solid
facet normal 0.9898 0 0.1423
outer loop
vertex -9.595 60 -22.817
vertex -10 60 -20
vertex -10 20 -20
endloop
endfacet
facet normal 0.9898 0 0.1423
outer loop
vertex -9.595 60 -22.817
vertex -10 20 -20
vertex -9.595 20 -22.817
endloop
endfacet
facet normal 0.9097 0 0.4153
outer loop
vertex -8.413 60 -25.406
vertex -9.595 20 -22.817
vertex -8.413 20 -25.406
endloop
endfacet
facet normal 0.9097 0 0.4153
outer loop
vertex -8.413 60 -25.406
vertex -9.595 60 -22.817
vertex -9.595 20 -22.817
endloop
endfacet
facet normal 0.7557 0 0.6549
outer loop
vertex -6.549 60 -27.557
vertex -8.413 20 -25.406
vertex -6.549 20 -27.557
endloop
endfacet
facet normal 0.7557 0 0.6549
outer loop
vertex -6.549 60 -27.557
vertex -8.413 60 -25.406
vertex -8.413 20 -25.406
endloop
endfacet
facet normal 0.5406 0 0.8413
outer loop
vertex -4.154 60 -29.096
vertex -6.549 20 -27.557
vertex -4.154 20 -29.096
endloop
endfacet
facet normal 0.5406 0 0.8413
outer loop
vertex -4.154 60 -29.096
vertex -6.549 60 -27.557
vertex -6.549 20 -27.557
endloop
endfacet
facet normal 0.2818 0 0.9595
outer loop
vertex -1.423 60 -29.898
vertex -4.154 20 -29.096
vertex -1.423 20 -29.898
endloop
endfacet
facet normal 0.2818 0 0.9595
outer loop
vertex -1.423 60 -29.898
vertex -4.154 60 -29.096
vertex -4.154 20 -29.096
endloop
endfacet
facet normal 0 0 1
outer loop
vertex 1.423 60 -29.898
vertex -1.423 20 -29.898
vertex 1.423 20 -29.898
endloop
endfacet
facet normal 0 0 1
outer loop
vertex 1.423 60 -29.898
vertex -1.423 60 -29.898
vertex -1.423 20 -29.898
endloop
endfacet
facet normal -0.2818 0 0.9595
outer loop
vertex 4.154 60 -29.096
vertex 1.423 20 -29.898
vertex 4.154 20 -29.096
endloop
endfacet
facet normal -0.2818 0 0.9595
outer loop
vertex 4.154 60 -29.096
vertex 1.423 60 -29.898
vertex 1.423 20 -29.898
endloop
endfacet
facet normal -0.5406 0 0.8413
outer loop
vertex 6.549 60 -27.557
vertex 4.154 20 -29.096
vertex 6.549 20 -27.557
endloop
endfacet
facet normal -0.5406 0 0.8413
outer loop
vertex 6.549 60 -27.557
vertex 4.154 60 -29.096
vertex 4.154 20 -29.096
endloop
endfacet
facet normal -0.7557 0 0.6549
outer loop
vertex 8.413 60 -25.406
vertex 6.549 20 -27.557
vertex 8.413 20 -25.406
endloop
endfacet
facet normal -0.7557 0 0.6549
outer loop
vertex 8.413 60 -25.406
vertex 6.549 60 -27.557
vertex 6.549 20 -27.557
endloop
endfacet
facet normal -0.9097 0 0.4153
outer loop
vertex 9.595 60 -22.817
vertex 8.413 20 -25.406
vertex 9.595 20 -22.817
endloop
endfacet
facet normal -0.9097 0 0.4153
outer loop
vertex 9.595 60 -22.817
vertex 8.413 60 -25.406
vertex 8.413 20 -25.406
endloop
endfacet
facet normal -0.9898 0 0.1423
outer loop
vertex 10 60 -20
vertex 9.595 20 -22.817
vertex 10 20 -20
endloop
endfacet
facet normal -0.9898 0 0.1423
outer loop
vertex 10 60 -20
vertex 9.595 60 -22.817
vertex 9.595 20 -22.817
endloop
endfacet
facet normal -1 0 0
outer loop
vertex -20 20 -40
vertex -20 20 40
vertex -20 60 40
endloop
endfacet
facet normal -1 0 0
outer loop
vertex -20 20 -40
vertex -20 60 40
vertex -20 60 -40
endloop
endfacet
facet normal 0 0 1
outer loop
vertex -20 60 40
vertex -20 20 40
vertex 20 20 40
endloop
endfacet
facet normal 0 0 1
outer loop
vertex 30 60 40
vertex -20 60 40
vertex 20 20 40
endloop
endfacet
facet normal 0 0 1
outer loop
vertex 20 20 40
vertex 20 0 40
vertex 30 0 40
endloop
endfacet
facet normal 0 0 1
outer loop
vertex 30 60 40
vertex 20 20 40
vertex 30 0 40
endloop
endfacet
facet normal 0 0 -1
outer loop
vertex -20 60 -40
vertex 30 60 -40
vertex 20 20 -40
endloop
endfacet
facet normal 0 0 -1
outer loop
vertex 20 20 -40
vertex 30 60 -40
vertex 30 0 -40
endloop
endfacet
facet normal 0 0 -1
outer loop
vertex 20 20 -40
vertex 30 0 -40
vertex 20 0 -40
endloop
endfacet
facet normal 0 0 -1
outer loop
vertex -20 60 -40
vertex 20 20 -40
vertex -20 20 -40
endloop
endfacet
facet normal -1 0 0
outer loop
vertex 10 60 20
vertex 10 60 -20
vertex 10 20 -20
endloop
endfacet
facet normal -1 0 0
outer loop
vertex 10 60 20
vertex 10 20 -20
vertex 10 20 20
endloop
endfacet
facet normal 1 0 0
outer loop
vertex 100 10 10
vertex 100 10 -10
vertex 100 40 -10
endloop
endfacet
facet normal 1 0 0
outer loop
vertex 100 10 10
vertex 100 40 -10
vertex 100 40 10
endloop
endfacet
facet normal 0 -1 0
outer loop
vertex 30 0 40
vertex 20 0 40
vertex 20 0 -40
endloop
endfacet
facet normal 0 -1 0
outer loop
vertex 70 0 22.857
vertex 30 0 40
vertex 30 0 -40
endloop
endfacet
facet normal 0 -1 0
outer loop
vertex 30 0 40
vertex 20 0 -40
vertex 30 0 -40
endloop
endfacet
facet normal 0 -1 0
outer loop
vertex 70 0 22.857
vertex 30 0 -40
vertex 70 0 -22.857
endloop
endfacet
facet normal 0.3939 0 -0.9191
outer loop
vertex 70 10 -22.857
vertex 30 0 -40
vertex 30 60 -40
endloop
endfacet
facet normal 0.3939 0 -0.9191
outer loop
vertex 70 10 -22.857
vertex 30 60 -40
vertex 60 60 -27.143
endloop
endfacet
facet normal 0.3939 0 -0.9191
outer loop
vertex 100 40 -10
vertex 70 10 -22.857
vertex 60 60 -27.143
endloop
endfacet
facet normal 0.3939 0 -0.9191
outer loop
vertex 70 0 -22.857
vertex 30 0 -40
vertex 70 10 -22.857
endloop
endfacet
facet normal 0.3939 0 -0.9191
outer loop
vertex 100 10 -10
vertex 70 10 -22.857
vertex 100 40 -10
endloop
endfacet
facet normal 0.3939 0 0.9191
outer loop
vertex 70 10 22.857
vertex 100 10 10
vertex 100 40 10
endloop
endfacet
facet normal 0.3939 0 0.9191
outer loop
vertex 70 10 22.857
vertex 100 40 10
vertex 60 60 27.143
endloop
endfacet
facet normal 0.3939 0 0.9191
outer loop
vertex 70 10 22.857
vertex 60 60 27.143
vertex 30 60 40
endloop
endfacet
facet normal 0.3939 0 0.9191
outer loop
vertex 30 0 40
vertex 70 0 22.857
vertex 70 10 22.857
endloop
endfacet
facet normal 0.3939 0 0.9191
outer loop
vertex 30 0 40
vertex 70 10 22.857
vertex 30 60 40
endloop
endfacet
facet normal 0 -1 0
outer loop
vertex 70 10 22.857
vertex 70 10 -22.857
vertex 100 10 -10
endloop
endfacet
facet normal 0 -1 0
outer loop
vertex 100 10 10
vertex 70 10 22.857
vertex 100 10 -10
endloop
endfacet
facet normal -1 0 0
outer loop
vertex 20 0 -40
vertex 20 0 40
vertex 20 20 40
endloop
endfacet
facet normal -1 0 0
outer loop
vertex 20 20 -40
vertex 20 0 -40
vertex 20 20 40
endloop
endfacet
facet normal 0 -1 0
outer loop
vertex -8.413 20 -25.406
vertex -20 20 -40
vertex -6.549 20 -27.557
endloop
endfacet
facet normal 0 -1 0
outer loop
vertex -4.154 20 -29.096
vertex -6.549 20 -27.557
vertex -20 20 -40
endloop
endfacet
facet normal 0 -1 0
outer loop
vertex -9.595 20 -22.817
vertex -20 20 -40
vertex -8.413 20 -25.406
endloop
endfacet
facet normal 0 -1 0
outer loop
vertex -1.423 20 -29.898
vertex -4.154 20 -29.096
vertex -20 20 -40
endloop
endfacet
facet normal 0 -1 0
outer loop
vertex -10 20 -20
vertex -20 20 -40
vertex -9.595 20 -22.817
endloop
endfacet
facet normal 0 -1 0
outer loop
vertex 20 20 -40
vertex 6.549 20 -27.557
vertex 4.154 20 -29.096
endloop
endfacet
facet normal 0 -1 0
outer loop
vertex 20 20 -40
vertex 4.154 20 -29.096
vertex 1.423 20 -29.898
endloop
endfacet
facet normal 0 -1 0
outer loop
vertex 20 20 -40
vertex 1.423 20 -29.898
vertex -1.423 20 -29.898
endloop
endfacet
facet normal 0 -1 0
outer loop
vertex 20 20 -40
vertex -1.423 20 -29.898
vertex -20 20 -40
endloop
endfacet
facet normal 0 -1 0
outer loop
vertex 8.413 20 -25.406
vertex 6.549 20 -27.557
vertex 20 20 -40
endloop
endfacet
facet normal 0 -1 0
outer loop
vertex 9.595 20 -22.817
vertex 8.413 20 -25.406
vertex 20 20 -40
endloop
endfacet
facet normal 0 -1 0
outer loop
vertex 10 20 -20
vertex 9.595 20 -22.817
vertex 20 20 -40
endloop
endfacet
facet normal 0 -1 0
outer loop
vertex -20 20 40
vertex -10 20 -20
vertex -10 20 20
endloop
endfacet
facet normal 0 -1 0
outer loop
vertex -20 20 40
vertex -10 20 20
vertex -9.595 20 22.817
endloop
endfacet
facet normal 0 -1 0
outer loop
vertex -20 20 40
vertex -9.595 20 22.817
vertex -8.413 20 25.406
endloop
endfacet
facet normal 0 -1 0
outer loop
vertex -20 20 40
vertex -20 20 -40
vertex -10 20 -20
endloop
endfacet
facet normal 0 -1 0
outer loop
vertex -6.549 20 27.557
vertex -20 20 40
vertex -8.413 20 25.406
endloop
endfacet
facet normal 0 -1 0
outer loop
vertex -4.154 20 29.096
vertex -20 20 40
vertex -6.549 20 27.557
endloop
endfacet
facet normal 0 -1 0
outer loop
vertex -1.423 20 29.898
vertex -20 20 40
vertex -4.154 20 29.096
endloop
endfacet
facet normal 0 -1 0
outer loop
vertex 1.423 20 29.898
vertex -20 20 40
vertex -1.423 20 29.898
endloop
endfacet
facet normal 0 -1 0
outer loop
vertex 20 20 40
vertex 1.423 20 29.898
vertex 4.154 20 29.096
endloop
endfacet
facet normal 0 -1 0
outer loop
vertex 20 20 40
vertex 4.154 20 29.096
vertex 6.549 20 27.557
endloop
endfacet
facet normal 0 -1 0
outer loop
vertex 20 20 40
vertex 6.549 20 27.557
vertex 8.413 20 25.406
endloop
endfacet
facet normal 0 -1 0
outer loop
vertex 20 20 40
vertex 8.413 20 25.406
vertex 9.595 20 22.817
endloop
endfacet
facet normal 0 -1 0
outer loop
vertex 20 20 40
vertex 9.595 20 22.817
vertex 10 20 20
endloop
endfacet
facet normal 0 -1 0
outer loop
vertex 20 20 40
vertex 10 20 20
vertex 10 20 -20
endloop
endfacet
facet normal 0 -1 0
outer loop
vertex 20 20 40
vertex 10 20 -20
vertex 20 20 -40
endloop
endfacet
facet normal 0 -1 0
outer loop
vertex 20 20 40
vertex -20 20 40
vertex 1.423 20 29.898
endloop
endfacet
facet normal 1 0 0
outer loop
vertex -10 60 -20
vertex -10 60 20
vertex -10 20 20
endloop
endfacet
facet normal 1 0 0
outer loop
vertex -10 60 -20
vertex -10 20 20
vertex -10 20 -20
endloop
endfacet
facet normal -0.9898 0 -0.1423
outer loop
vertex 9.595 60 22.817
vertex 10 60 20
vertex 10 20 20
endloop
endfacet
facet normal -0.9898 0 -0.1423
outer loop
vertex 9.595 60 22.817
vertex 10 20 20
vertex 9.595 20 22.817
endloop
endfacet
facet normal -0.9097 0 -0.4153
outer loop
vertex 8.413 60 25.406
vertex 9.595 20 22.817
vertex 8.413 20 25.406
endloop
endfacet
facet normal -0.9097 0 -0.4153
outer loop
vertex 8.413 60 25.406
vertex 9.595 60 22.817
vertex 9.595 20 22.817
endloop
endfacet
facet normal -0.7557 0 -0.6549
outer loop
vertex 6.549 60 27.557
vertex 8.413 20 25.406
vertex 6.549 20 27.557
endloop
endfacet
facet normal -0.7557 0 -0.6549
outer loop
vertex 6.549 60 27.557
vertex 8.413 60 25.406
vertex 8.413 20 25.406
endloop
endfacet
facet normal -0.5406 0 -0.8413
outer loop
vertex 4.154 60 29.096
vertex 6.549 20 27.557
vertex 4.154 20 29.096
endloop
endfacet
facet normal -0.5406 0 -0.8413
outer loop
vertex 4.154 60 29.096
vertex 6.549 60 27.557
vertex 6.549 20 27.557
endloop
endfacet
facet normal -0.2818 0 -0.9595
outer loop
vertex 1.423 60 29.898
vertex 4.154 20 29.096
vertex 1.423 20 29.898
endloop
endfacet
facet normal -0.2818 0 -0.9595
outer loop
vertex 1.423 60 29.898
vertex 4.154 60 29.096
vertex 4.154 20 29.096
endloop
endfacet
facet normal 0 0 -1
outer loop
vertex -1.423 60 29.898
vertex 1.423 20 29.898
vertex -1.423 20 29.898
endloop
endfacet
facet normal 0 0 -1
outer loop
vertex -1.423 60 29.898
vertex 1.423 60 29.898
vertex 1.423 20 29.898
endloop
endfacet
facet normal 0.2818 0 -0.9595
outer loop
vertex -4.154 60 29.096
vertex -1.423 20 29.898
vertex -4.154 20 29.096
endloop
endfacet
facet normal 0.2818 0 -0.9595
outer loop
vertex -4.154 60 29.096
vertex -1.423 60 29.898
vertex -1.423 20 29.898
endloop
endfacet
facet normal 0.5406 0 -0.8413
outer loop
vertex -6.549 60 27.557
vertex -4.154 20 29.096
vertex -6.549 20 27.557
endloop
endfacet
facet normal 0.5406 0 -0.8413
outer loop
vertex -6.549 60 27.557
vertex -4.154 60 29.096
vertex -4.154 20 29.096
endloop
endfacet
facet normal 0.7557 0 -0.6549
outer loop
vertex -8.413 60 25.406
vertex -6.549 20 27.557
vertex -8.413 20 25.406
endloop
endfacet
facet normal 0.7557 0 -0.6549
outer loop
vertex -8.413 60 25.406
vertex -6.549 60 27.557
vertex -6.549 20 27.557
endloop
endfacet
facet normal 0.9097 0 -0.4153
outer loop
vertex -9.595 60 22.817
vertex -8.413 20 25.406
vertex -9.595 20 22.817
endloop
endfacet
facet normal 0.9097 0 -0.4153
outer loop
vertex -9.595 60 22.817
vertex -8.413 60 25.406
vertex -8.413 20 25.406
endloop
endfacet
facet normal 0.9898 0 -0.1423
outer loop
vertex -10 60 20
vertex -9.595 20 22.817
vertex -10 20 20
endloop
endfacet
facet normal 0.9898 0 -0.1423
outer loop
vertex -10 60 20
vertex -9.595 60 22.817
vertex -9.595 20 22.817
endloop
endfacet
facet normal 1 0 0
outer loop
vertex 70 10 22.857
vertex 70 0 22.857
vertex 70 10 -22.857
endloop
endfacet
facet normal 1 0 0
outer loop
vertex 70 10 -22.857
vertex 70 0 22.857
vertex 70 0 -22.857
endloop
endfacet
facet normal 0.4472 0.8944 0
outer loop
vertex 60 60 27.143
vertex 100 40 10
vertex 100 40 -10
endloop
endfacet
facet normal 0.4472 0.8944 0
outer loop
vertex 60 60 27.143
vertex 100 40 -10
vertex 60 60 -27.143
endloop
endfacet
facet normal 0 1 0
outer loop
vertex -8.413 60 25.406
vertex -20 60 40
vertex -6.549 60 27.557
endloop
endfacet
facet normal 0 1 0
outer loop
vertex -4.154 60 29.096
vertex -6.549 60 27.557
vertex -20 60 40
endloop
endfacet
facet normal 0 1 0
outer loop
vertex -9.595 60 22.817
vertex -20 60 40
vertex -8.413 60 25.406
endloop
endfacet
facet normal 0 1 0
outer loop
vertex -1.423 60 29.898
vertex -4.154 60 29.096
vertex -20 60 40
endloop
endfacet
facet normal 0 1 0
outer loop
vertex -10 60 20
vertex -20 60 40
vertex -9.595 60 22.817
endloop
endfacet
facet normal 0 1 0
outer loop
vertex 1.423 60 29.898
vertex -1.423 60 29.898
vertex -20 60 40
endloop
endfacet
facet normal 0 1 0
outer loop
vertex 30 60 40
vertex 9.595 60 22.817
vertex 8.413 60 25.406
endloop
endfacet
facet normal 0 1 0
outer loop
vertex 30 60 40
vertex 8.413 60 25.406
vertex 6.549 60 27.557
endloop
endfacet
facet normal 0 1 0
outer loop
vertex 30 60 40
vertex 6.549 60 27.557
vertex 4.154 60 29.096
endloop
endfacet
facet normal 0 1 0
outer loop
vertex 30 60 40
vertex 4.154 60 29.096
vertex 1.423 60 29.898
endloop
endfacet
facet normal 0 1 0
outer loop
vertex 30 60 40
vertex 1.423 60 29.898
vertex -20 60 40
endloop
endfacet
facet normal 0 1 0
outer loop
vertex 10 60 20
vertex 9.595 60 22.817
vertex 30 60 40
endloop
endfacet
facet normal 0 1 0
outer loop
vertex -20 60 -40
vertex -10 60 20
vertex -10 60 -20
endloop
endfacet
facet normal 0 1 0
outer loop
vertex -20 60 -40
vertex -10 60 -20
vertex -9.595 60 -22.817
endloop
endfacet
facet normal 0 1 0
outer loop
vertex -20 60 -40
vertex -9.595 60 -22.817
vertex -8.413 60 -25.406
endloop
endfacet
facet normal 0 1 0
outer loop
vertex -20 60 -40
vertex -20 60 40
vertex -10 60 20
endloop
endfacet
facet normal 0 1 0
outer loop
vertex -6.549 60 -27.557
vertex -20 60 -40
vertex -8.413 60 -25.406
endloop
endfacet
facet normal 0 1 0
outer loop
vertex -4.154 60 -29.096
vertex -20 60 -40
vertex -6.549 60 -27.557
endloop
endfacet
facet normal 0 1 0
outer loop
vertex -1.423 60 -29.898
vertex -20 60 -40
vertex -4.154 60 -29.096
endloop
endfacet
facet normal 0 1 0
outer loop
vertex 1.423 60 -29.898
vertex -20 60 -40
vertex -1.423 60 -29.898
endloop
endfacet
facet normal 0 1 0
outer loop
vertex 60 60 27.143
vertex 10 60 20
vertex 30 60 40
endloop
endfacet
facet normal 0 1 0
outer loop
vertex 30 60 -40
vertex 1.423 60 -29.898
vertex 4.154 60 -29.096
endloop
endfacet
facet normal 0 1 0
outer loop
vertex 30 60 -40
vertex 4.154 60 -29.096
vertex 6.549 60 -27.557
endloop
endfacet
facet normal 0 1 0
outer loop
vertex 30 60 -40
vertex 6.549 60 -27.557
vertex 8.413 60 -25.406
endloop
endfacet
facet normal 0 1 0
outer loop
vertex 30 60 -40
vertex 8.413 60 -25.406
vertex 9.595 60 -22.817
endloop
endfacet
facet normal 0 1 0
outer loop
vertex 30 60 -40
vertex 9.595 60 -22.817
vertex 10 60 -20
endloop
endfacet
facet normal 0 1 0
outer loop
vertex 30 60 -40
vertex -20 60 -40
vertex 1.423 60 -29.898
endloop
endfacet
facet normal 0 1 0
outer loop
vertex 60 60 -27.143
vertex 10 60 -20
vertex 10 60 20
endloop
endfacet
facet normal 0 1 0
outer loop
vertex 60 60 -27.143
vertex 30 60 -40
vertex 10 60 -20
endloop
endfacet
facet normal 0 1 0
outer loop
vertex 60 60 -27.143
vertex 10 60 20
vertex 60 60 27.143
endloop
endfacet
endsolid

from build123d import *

# Parameters (mm, degrees)
SKETCH1_W           = 40
SKETCH1_H           = 80
SKETCH1_W_2         = 10
BOSS_EXTRUDE1_DEPTH = 60
SKETCH2_W           = 40
SKETCH2_H           = 20
CUT_EXTRUDE1_DEPTH  = 81
CUT_EXTRUDE2_DEPTH  = 10
CUT_EXTRUDE3_DEPTH  = 61
CUT_EXTRUDE4_DEPTH  = 81


with BuildPart() as part:
    # Sketch1 → Boss-Extrude1 (new body)
    with BuildSketch(Plane(origin=(0, 0, 0), x_dir=(1, 0, 0), z_dir=(0, 1, 0))):
        Rectangle(SKETCH1_W, SKETCH1_H)
        Polygon((100, -10), (30, -40), (30, 40), (100, 10), align=None)
        with Locations((25, 0)):
            Rectangle(SKETCH1_W_2, SKETCH1_H)
    extrude(amount=BOSS_EXTRUDE1_DEPTH)

    # Sketch2 → Cut-Extrude1 (cut, through all)
    with BuildSketch(Plane.XY.offset(40)):
        with Locations((0, 10)):
            Rectangle(SKETCH2_W, SKETCH2_H)
    extrude(amount=-CUT_EXTRUDE1_DEPTH, mode=Mode.SUBTRACT)

    # Sketch3 → Cut-Extrude2 (cut)
    with BuildSketch(Plane.XZ):
        Polygon((70, 0), (100, 0), (100, 10), (70, 22.857142857), align=None)
        Polygon((100, -10), (100, 0), (70, 0), (70, -22.857142857), align=None)
    extrude(amount=-CUT_EXTRUDE2_DEPTH, mode=Mode.SUBTRACT)

    # Sketch5 → Cut-Extrude3 (cut, through all)
    with BuildSketch(Plane(origin=(0, 60, 0), x_dir=(1, 0, 0), z_dir=(0, 1, 0))):
        with BuildLine():
            Line((-10, -20), (-10, 20))
            ThreePointArc((-10, 20), (0, 30), (10, 20))
            Line((10, 20), (10, -20))
            ThreePointArc((10, -20), (0, -30), (-10, -20))
        make_face()
    extrude(amount=-CUT_EXTRUDE3_DEPTH, mode=Mode.SUBTRACT)

    # Sketch6 → Cut-Extrude4 (cut, through all)
    with BuildSketch(Plane.XY.offset(40)):
        Polygon((60, 60), (100, 60), (100, 40), align=None)
    extrude(amount=-CUT_EXTRUDE4_DEPTH, mode=Mode.SUBTRACT)


solid = part.part
